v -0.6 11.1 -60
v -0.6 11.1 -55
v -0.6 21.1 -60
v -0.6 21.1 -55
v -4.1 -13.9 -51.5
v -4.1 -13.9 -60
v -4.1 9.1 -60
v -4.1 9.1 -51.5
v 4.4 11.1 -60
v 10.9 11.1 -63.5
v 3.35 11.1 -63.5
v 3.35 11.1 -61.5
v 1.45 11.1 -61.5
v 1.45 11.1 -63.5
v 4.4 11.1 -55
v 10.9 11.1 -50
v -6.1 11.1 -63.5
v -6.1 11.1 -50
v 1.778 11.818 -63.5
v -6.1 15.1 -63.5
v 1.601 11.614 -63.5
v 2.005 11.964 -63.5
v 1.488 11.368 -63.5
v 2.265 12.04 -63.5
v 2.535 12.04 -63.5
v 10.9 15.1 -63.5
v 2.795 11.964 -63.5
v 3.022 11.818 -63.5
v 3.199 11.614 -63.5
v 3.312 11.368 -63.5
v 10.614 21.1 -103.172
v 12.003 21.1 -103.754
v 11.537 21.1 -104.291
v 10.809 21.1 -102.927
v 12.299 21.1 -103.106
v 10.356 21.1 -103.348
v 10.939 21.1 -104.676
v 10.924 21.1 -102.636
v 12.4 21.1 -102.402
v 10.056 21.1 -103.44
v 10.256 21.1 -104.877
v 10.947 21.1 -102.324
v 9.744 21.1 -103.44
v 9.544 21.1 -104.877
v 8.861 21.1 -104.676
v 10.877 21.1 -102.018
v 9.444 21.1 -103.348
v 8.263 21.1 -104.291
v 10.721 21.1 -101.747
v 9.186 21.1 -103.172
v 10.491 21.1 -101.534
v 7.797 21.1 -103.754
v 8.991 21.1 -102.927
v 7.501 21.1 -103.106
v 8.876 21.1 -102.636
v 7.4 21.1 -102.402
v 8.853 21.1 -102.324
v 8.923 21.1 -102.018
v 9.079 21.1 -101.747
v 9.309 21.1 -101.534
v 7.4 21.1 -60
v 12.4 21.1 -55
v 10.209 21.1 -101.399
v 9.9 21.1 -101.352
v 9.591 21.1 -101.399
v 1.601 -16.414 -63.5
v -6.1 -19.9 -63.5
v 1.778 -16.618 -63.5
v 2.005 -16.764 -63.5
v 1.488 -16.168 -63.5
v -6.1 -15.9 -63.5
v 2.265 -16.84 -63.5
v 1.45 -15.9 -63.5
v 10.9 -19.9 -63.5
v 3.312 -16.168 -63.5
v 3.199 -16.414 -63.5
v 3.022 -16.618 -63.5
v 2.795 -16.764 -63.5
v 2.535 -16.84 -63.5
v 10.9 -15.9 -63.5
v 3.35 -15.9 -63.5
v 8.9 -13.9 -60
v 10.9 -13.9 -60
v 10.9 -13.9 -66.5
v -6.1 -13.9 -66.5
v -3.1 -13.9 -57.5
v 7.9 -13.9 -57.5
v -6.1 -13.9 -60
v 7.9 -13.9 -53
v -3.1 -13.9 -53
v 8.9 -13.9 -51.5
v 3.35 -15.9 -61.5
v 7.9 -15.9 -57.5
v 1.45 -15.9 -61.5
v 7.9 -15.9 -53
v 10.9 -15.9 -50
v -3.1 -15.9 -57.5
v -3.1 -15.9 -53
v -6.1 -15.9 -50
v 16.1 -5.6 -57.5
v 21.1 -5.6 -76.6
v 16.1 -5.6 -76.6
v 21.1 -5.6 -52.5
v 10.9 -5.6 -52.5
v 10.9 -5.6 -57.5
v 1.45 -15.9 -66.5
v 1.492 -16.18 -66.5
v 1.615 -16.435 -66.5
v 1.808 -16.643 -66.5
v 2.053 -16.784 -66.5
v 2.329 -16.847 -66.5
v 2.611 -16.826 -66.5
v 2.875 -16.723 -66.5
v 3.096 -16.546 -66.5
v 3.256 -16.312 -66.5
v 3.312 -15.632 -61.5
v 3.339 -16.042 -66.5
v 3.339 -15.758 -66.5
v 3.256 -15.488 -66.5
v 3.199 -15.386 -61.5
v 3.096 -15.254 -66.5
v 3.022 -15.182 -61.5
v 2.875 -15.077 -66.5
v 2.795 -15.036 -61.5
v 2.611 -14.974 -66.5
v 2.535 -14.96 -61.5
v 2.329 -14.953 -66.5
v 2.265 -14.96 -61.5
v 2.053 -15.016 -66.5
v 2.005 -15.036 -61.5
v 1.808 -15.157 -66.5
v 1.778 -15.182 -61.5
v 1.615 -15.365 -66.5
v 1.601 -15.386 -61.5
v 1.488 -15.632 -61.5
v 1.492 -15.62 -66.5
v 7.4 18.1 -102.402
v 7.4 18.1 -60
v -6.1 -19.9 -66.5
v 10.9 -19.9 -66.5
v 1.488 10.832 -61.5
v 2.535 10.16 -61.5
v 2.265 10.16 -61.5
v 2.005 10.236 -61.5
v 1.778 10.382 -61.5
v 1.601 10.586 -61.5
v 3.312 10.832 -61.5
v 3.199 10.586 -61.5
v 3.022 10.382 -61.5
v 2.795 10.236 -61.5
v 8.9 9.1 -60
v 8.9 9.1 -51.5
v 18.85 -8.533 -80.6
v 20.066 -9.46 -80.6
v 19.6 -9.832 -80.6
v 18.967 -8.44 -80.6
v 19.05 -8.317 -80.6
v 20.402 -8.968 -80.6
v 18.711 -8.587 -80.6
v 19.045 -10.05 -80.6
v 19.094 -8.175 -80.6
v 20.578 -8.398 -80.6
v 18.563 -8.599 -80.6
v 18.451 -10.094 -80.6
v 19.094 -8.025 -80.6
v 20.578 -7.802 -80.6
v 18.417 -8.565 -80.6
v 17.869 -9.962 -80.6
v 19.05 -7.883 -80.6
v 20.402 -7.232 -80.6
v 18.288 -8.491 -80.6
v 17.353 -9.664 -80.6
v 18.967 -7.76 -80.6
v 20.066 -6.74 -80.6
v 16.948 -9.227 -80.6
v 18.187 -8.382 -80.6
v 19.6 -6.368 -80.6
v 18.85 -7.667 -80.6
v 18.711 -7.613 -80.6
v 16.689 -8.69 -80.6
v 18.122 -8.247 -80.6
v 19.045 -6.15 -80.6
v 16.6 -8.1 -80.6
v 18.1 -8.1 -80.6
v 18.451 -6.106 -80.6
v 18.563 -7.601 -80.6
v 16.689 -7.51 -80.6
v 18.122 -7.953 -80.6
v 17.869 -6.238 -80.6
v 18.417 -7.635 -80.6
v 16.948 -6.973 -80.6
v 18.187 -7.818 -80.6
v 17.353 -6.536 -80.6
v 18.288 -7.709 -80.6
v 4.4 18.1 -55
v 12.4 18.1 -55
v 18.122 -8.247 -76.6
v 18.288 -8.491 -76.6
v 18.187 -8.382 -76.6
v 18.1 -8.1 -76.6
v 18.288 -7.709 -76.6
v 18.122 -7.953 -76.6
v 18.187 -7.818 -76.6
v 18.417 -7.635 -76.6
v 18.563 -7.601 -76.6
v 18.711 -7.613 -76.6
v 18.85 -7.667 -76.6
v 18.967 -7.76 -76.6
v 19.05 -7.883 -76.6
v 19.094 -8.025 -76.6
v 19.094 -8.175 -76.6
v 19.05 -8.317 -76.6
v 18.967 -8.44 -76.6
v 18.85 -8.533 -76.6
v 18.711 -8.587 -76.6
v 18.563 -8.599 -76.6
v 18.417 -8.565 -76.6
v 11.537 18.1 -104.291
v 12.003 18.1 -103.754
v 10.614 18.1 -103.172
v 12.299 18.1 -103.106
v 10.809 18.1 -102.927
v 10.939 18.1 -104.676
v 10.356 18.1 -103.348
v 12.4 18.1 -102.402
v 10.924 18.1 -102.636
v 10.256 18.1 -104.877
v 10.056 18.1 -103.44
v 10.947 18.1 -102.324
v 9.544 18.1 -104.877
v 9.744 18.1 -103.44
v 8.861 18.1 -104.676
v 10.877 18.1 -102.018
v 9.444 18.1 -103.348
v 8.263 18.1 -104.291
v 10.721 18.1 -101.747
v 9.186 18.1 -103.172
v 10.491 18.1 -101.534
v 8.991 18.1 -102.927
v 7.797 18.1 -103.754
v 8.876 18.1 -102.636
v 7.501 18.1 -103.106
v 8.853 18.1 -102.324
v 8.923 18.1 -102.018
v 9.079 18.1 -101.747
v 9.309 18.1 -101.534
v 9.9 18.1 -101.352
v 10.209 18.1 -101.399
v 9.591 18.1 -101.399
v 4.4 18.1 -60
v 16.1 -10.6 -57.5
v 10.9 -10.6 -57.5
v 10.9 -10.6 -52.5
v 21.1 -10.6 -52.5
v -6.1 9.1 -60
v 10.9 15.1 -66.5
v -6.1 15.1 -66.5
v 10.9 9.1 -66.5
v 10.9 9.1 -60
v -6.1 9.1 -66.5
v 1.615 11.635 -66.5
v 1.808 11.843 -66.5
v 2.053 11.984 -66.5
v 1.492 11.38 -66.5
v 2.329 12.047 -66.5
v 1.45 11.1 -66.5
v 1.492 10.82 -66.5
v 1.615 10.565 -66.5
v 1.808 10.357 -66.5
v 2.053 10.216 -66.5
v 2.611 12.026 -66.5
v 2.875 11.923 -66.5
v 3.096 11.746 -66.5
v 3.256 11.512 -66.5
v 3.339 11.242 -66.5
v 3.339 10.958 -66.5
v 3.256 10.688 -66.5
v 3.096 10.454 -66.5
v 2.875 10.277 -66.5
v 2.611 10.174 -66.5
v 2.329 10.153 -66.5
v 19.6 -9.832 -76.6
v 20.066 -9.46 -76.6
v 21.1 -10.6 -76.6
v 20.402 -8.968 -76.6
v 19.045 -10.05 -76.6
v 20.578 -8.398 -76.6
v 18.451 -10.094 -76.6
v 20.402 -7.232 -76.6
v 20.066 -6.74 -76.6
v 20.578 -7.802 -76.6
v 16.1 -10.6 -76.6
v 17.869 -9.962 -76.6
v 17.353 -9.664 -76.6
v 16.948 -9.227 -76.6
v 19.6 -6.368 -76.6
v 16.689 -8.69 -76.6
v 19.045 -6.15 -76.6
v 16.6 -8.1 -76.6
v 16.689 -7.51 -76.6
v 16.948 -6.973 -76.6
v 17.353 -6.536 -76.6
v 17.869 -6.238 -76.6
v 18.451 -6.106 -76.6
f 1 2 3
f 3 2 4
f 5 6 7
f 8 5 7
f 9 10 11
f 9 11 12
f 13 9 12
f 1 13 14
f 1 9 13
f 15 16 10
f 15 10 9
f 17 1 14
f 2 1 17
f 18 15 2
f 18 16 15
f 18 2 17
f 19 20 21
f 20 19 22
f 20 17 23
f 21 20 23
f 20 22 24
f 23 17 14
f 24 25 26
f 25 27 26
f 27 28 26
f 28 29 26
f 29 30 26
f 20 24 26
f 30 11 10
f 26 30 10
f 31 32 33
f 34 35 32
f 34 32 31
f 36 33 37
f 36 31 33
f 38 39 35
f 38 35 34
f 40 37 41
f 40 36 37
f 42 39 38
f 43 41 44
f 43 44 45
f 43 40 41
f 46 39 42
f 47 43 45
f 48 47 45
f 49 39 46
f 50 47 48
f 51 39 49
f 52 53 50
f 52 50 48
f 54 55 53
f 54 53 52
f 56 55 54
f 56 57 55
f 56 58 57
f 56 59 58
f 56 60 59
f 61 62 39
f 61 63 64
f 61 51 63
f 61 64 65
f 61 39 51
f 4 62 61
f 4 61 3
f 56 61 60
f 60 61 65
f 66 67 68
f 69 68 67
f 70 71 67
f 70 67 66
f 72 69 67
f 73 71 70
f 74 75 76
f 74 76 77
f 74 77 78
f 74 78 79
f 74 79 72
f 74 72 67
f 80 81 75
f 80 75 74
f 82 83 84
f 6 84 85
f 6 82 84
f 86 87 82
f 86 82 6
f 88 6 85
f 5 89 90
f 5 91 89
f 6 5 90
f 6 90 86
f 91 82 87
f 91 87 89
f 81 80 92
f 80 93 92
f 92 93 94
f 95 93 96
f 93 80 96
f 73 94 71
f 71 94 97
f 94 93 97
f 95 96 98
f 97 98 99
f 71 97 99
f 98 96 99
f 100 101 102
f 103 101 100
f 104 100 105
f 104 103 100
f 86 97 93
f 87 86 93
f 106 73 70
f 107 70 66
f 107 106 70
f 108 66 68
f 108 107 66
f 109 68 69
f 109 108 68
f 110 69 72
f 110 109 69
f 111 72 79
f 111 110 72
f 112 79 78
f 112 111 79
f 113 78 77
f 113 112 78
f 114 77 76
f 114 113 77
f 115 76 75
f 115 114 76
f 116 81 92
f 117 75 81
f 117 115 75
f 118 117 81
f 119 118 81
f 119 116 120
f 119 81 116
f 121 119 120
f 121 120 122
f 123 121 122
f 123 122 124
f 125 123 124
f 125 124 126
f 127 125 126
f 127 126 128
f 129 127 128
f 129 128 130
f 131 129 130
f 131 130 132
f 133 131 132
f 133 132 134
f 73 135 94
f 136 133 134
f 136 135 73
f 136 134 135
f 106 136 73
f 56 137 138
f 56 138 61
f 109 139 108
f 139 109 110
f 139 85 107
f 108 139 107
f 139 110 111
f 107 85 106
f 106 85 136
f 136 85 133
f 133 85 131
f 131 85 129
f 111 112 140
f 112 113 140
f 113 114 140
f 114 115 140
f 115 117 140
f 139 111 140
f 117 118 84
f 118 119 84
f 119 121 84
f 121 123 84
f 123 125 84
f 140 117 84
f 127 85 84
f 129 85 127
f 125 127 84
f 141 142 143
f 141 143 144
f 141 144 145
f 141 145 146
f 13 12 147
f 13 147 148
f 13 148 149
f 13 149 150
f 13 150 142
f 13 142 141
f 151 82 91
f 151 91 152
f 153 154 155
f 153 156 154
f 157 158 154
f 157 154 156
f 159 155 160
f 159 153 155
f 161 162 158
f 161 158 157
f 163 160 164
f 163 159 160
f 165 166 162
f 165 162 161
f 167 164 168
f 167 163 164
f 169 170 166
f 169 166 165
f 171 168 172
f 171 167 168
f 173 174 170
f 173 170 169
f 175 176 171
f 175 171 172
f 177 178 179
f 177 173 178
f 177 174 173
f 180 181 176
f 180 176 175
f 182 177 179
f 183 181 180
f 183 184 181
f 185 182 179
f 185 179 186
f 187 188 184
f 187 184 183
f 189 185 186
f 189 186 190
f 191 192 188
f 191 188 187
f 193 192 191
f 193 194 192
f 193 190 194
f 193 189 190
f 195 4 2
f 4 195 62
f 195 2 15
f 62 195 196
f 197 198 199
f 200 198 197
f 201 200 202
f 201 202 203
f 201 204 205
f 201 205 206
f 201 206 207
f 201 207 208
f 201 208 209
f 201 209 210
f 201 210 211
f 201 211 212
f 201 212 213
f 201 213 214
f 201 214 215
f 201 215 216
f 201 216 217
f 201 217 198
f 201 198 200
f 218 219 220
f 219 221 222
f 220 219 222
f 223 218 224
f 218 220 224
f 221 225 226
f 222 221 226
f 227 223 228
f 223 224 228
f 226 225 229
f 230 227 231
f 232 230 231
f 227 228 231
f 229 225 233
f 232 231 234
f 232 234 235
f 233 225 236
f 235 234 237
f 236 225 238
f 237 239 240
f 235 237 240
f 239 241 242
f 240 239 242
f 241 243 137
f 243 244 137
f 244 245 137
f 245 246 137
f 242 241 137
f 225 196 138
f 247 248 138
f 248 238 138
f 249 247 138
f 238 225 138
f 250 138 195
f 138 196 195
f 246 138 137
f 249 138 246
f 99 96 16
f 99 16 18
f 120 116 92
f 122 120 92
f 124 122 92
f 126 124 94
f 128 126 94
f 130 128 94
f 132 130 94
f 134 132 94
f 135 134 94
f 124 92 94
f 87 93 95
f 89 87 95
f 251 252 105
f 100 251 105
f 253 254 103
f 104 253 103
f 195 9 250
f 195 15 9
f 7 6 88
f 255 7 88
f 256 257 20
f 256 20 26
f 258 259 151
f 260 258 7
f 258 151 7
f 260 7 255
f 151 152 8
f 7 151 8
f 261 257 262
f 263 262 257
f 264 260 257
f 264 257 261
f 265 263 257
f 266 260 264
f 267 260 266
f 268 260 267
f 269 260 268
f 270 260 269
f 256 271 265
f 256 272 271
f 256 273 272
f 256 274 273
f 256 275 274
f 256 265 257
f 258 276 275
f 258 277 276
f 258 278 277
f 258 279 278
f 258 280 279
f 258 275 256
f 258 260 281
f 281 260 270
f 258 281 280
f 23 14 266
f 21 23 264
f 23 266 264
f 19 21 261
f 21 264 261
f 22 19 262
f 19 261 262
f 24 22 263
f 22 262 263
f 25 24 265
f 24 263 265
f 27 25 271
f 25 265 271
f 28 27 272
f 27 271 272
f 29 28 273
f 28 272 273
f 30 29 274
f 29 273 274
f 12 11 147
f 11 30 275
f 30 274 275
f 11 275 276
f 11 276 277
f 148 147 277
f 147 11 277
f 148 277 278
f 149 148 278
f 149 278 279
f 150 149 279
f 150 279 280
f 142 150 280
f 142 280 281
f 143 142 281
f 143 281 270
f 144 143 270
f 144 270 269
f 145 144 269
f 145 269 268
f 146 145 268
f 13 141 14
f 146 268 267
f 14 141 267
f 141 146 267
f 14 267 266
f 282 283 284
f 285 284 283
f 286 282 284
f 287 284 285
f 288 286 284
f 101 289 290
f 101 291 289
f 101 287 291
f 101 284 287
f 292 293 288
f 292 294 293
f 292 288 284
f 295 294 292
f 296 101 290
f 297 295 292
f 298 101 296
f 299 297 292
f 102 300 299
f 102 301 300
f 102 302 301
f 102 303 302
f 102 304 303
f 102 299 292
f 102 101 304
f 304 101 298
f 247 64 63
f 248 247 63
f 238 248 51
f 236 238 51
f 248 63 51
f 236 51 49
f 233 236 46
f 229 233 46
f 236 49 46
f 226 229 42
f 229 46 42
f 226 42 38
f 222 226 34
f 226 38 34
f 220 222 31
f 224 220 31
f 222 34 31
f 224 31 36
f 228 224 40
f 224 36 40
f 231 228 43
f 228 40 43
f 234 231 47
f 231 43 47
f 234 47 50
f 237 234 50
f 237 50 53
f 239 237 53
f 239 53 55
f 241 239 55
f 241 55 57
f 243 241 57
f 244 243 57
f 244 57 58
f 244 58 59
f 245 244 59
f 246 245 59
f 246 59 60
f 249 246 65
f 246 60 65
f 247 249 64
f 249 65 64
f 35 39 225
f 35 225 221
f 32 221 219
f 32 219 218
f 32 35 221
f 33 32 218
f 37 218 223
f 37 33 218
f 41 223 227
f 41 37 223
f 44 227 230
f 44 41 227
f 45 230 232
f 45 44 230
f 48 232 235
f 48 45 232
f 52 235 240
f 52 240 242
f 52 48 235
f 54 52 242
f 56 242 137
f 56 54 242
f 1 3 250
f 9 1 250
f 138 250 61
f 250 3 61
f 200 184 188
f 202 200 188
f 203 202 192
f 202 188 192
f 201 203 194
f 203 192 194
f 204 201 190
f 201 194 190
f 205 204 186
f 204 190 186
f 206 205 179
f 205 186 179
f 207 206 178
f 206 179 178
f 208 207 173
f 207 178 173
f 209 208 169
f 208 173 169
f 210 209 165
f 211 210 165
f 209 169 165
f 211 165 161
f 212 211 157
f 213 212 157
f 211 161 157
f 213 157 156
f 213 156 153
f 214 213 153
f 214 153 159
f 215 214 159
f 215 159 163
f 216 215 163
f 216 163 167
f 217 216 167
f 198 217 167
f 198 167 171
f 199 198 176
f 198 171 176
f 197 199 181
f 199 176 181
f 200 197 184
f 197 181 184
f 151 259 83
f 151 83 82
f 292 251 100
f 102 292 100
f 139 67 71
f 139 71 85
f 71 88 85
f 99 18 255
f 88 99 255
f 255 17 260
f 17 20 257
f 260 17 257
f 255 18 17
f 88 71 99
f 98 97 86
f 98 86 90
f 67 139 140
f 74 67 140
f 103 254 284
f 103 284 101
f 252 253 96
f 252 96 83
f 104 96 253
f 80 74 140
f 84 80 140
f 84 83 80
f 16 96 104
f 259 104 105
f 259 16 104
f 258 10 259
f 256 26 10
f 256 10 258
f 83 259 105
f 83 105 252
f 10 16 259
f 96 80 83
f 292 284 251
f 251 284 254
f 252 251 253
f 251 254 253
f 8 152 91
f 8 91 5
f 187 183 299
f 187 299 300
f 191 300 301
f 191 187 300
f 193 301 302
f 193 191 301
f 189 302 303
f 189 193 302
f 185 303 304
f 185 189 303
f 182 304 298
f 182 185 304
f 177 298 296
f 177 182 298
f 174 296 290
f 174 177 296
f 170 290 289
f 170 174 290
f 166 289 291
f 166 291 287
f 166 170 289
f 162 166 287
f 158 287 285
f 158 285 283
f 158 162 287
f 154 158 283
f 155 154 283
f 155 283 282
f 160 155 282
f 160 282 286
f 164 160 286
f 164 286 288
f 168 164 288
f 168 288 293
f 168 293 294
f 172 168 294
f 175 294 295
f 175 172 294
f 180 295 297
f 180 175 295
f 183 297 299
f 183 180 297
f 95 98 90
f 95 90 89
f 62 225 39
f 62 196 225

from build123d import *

# Parameters (mm, degrees)
SKETCH1_W            = 4.8
SKETCH1_H            = 4.8
BOSS_EXTRUDE1_DEPTH  = 1
SKETCH2_W            = 5.2
SKETCH2_H            = 5.2
BOSS_EXTRUDE2_DEPTH  = 50
SKETCH3_W            = 17
SKETCH3_H            = 27
BOSS_EXTRUDE3_DEPTH  = 10
SKETCH4_W            = 13
SKETCH4_H            = 23
CUT_EXTRUDE1_DEPTH   = 8.5
SKETCH5_W            = 11
SKETCH5_H            = 4.5
CUT_EXTRUDE2_DEPTH   = 4
SKETCH13_W           = 17
SKETCH13_H           = 27
CUT_EXTRUDE3_DEPTH   = 55.521738784
SKETCH14_W           = 17
SKETCH14_H           = 2
BOSS_EXTRUDE5_DEPTH  = 6.5
SKETCH15_W           = 17
SKETCH15_H           = 3
BOSS_EXTRUDE6_DEPTH  = 4
SKETCH16_R           = 0.95
CUT_EXTRUDE4_DEPTH   = 5
SKETCH17_W           = 5
SKETCH17_H           = 5
BOSS_EXTRUDE7_DEPTH  = 10.2
SKETCH18_W           = 5
SKETCH18_H           = 5
BOSS_EXTRUDE8_DEPTH  = 23.1
SKETCH19_W           = 5
SKETCH19_H           = 5
SKETCH19_R           = 2
CUT_EXTRUDE5_DEPTH   = 4
SKETCH20_R           = 0.5
CUT_EXTRUDE6_DEPTH   = 4
SKETCH21_W           = 5
SKETCH21_H           = 5
BOSS_EXTRUDE9_DEPTH  = 10
SKETCH22_W           = 5
SKETCH22_H           = 3
BOSS_EXTRUDE10_DEPTH = 42.402
SKETCH23_R           = 2.5
BOSS_EXTRUDE11_DEPTH = 3
SKETCH24_R           = 1.05
CUT_EXTRUDE7_DEPTH   = 3
SKETCH26_W           = 13
SKETCH26_H           = 5
BOSS_EXTRUDE12_DEPTH = 3
SKETCH28_W           = 5
SKETCH28_H           = 3
BOSS_EXTRUDE13_DEPTH = 42.402
SKETCH29_R           = 2.5
BOSS_EXTRUDE14_DEPTH = 3
SKETCH30_R           = 1.05
CUT_EXTRUDE8_DEPTH   = 3
SKETCH32_W           = 44.902
SKETCH32_H           = 3
CUT_EXTRUDE9_DEPTH   = 109.298336109


with BuildPart() as part:
    # Sketch1 → Boss-Extrude1 (new body)
    with BuildSketch(Plane.XY):
        with Locations((2.4, -2.4)):
            Rectangle(SKETCH1_W, SKETCH1_H)
    extrude(amount=BOSS_EXTRUDE1_DEPTH)

    # Sketch2 → Boss-Extrude2 (add)
    with BuildSketch(Plane(origin=(0, 0, 0), x_dir=(-1, 0, 0), z_dir=(0, 0, -1))):
        with Locations((-2.4, -2.4)):
            Rectangle(SKETCH2_W, SKETCH2_H)
    extrude(amount=BOSS_EXTRUDE2_DEPTH)

    # Sketch3 → Boss-Extrude3 (add)
    with BuildSketch(Plane(origin=(0, 0, -50), x_dir=(-1, 0, 0), z_dir=(0, 0, -1))):
        with Locations((-2.4, -2.4)):
            Rectangle(SKETCH3_W, SKETCH3_H)
    extrude(amount=BOSS_EXTRUDE3_DEPTH)

    # Sketch4 → Cut-Extrude1 (cut)
    with BuildSketch(Plane(origin=(0, 0, -60), x_dir=(-1, 0, 0), z_dir=(0, 0, -1))):
        with Locations((-2.4, -2.4)):
            Rectangle(SKETCH4_W, SKETCH4_H)
    extrude(amount=-CUT_EXTRUDE1_DEPTH, mode=Mode.SUBTRACT)

    # Sketch5 → Cut-Extrude2 (cut)
    with BuildSketch(Plane.XZ.offset(15.9)):
        with Locations((2.4, -55.25)):
            Rectangle(SKETCH5_W, SKETCH5_H)
    extrude(amount=-CUT_EXTRUDE2_DEPTH, mode=Mode.SUBTRACT)

    # Sketch13 → Cut-Extrude3 (cut, through all)
    with BuildSketch(Plane.XY.offset(-50)):
        with Locations((2.4, -2.4)):
            Rectangle(SKETCH13_W, SKETCH13_H)
    extrude(amount=CUT_EXTRUDE3_DEPTH, mode=Mode.SUBTRACT)

    # Sketch14 → Boss-Extrude5 (add)
    with BuildSketch(Plane(origin=(0, 0, -60), x_dir=(-1, 0, 0), z_dir=(0, 0, -1))):
        with Locations((-2.4, 10.1)):
            Rectangle(SKETCH14_W, SKETCH14_H)
    boss_extrude5 = extrude(amount=BOSS_EXTRUDE5_DEPTH)

    # Sketch15 → Boss-Extrude6 (add)
    with BuildSketch(Plane(origin=(0, 11.1, 0), x_dir=(1, 0, 0), z_dir=(0, 1, 0))):
        with Locations((2.4, 65)):
            Rectangle(SKETCH15_W, SKETCH15_H)
    boss_extrude6 = extrude(amount=BOSS_EXTRUDE6_DEPTH)

    # Sketch16 → Cut-Extrude4 (cut)
    with BuildSketch(Plane(origin=(0, 0, -66.5), x_dir=(-1, 0, 0), z_dir=(0, 0, -1))):
        with Locations((-2.4, 11.1)):
            Circle(SKETCH16_R)
    cut_extrude4 = extrude(amount=-CUT_EXTRUDE4_DEPTH, mode=Mode.SUBTRACT)

    # Mirror2: Boss-Extrude5, Boss-Extrude6, Cut-Extrude4 across plane
    add(boss_extrude5.mirror(Plane(origin=(0, -2.4, 0), x_dir=(0, 0, 1), z_dir=(0, -1, 0))))
    add(boss_extrude6.mirror(Plane(origin=(0, -2.4, 0), x_dir=(0, 0, 1), z_dir=(0, -1, 0))))
    add(cut_extrude4.mirror(Plane(origin=(0, -2.4, 0), x_dir=(0, 0, 1), z_dir=(0, -1, 0))), mode=Mode.SUBTRACT)

    # Sketch17 → Boss-Extrude7 (add)
    with BuildSketch(Plane(origin=(10.9, 0, 0), x_dir=(0, 0, -1), z_dir=(1, 0, 0))):
        with Locations((55, -8.1)):
            Rectangle(SKETCH17_W, SKETCH17_H)
    extrude(amount=BOSS_EXTRUDE7_DEPTH)

    # Sketch18 → Boss-Extrude8 (add)
    with BuildSketch(Plane(origin=(0, 0, -57.5), x_dir=(-1, 0, 0), z_dir=(0, 0, -1))):
        with Locations((-18.6, -8.1)):
            Rectangle(SKETCH18_W, SKETCH18_H)
    extrude(amount=BOSS_EXTRUDE8_DEPTH)

    # Sketch19 → Cut-Extrude5 (cut)
    with BuildSketch(Plane(origin=(0, 0, -80.6), x_dir=(-1, 0, 0), z_dir=(0, 0, -1))):
        with Locations((-18.6, -8.1)):
            Rectangle(SKETCH19_W, SKETCH19_H)
        with Locations((-18.6, -8.1)):
            Circle(SKETCH19_R, mode=Mode.SUBTRACT)
    extrude(amount=-CUT_EXTRUDE5_DEPTH, mode=Mode.SUBTRACT)

    # Sketch20 → Cut-Extrude6 (cut)
    with BuildSketch(Plane(origin=(0, 0, -80.6), x_dir=(-1, 0, 0), z_dir=(0, 0, -1))):
        with Locations((-18.6, -8.1)):
            Circle(SKETCH20_R)
    extrude(amount=-CUT_EXTRUDE6_DEPTH, mode=Mode.SUBTRACT)

    # Sketch21 → Boss-Extrude9 (add)
    with BuildSketch(Plane(origin=(0, 11.1, 0), x_dir=(1, 0, 0), z_dir=(0, 1, 0))):
        with Locations((1.9, 57.5)):
            Rectangle(SKETCH21_W, SKETCH21_H)
    extrude(amount=BOSS_EXTRUDE9_DEPTH)

    # Sketch22 → Boss-Extrude10 (add)
    with BuildSketch(Plane(origin=(0, 0, -60), x_dir=(-1, 0, 0), z_dir=(0, 0, -1))):
        with Locations((-1.9, 19.6)):
            Rectangle(SKETCH22_W, SKETCH22_H)
    extrude(amount=BOSS_EXTRUDE10_DEPTH)

    # Sketch23 → Boss-Extrude11 (add)
    with BuildSketch(Plane(origin=(0, 21.1, 0), x_dir=(1, 0, 0), z_dir=(0, 1, 0))):
        with Locations((1.9, 102.402)):
            Circle(SKETCH23_R)
    extrude(amount=-BOSS_EXTRUDE11_DEPTH)

    # Sketch24 → Cut-Extrude7 (cut)
    with BuildSketch(Plane(origin=(0, 21.1, 0), x_dir=(1, 0, 0), z_dir=(0, 1, 0))):
        with Locations(Location((1.9, 102.402, 0), (0, 0, 270))):
            Circle(SKETCH24_R)
    extrude(amount=-CUT_EXTRUDE7_DEPTH, mode=Mode.SUBTRACT)

    # Sketch26 → Boss-Extrude12 (add)
    with BuildSketch(Plane(origin=(0, 21.1, 0), x_dir=(1, 0, 0), z_dir=(0, 1, 0))):
        with Locations((5.9, 57.5)):
            Rectangle(SKETCH26_W, SKETCH26_H)
    extrude(amount=-BOSS_EXTRUDE12_DEPTH)

    # Sketch28 → Boss-Extrude13 (add)
    with BuildSketch(Plane(origin=(0, 0, -60), x_dir=(-1, 0, 0), z_dir=(0, 0, -1))):
        with Locations((-9.9, 19.6)):
            Rectangle(SKETCH28_W, SKETCH28_H)
    extrude(amount=BOSS_EXTRUDE13_DEPTH)

    # Sketch29 → Boss-Extrude14 (add)
    with BuildSketch(Plane(origin=(0, 21.1, 0), x_dir=(1, 0, 0), z_dir=(0, 1, 0))):
        with Locations((9.9, 102.402)):
            Circle(SKETCH29_R)
    extrude(amount=-BOSS_EXTRUDE14_DEPTH)

    # Sketch30 → Cut-Extrude8 (cut)
    with BuildSketch(Plane(origin=(0, 21.1, 0), x_dir=(1, 0, 0), z_dir=(0, 1, 0))):
        with Locations(Location((9.9, 102.402, 0), (0, 0, 270))):
            Circle(SKETCH30_R)
    extrude(amount=-CUT_EXTRUDE8_DEPTH, mode=Mode.SUBTRACT)

    # Sketch32 → Cut-Extrude9 (cut, through all)
    with BuildSketch(Plane(origin=(4.4, 0, 0), x_dir=(0, 0, -1), z_dir=(1, 0, 0))):
        with Locations((82.451, 19.6)):
            Rectangle(SKETCH32_W, SKETCH32_H)
    extrude(amount=-CUT_EXTRUDE9_DEPTH, mode=Mode.SUBTRACT)


solid = part.part
